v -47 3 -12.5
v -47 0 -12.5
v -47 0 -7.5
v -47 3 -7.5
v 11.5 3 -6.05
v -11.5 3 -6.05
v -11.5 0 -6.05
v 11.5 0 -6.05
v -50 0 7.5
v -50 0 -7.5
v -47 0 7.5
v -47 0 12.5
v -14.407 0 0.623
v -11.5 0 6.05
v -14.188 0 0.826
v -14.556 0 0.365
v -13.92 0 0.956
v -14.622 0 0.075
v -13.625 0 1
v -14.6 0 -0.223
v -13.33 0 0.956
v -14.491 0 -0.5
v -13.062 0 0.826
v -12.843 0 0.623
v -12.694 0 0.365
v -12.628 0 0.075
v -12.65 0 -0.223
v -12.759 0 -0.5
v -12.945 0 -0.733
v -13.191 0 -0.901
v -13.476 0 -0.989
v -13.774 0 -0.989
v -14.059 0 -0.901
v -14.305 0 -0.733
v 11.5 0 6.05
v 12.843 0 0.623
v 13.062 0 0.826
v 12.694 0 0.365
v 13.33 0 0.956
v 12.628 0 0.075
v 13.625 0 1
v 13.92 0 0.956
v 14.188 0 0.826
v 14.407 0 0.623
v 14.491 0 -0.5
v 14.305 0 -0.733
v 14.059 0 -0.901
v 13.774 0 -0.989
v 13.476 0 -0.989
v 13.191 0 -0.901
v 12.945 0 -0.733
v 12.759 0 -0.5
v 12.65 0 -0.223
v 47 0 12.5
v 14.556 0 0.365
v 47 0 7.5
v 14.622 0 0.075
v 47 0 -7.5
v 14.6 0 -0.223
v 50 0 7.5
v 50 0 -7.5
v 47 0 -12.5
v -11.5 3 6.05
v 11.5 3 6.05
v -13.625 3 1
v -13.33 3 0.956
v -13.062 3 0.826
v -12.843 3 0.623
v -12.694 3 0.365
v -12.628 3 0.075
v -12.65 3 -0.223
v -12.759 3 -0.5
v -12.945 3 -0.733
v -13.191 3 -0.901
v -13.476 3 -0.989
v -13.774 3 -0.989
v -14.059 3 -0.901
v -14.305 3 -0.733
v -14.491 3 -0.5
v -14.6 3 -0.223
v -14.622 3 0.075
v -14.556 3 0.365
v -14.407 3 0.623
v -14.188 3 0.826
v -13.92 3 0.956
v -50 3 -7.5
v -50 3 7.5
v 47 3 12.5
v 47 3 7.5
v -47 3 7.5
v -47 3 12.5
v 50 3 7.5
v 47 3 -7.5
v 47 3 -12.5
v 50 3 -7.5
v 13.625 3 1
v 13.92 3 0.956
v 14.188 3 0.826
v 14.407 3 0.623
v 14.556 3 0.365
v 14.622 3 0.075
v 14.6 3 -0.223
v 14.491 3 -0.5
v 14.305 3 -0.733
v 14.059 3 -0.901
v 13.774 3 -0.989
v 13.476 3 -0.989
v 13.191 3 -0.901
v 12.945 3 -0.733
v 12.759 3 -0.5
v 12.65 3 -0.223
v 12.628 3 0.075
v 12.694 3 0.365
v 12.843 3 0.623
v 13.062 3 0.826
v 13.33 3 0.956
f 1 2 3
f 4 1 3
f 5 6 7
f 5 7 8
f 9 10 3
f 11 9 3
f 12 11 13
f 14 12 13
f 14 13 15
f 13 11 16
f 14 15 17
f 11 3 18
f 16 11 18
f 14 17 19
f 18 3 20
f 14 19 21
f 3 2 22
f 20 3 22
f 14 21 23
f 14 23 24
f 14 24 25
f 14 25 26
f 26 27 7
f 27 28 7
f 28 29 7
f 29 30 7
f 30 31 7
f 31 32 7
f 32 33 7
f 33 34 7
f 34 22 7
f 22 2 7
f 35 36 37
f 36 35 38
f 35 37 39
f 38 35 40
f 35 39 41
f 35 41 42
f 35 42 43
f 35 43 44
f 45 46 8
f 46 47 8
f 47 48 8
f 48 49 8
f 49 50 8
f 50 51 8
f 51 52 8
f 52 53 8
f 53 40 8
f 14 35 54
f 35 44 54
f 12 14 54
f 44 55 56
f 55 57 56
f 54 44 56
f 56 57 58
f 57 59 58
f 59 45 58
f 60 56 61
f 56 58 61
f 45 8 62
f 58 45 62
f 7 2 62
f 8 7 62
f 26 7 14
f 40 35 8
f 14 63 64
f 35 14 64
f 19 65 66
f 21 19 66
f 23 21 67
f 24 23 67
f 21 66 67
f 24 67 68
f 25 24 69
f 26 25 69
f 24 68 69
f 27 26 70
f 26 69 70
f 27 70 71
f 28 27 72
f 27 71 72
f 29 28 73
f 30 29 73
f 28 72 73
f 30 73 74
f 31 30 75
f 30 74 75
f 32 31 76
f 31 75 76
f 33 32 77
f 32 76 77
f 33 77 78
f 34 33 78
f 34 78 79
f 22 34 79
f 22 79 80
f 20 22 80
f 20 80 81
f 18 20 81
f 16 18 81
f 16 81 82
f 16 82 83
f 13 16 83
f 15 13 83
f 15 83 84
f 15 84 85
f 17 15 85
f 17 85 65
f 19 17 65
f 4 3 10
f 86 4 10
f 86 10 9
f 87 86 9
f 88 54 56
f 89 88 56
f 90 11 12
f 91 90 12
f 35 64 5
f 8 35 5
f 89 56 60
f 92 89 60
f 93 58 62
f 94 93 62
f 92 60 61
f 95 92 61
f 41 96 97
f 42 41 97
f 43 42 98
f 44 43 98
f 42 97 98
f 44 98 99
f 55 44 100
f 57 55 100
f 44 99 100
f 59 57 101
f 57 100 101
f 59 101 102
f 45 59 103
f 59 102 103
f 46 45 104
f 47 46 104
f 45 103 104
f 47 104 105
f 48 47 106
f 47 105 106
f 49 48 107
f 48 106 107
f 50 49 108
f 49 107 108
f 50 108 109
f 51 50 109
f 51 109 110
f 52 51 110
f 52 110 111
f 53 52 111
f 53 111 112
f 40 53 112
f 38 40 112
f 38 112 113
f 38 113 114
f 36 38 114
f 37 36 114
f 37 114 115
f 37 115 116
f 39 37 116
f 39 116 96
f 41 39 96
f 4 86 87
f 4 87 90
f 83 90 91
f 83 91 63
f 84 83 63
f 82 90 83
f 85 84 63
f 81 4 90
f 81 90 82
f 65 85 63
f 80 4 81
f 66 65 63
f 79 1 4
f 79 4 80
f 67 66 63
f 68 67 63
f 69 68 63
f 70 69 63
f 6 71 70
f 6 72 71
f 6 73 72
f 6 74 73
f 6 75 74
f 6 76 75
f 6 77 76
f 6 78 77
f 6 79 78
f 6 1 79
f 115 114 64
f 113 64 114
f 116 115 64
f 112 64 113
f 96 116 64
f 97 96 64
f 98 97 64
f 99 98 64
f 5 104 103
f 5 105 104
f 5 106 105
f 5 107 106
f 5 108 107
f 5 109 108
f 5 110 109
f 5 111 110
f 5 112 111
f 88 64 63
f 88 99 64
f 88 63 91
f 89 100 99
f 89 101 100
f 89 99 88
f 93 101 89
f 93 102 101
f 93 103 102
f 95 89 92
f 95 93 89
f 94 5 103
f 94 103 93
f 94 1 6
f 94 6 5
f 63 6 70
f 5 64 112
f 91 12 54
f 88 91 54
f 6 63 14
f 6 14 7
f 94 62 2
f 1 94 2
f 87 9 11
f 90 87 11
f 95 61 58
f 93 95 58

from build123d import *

# Parameters (mm, degrees)
BOSS_EXTRUDE1_DEPTH = 3
SKETCH2_R           = 1
SKETCH2_W           = 23
SKETCH2_H           = 12.1
CUT_EXTRUDE1_DEPTH  = 23.3


with BuildPart() as part:
    # Sketch1 → Boss-Extrude1 (new body)
    with BuildSketch(Plane(origin=(0, 0, 0), x_dir=(1, 0, 0), z_dir=(0, 1, 0))):
        Polygon((47, -7.5), (50, -7.5), (50, 7.5), (47, 7.5), (47, 12.5), (-47, 12.5), (-47, 7.5), (-50, 7.5), (-50, -7.5), (-47, -7.5), (-47, -12.5), (47, -12.5), align=None)
    extrude(amount=BOSS_EXTRUDE1_DEPTH)

    # Sketch2 → Cut-Extrude1 (cut)
    with BuildSketch(Plane(origin=(0, 3, 0), x_dir=(1, 0, 0), z_dir=(0, 1, 0))):
        with Locations(Location((-13.625, 0, 0), (0, 0, 270))):
            Circle(SKETCH2_R)
        with Locations(Location((13.625, 0, 0), (0, 0, 270))):
            Circle(SKETCH2_R)
        Rectangle(SKETCH2_W, SKETCH2_H)
    extrude(amount=-CUT_EXTRUDE1_DEPTH, mode=Mode.SUBTRACT)


solid = part.part
